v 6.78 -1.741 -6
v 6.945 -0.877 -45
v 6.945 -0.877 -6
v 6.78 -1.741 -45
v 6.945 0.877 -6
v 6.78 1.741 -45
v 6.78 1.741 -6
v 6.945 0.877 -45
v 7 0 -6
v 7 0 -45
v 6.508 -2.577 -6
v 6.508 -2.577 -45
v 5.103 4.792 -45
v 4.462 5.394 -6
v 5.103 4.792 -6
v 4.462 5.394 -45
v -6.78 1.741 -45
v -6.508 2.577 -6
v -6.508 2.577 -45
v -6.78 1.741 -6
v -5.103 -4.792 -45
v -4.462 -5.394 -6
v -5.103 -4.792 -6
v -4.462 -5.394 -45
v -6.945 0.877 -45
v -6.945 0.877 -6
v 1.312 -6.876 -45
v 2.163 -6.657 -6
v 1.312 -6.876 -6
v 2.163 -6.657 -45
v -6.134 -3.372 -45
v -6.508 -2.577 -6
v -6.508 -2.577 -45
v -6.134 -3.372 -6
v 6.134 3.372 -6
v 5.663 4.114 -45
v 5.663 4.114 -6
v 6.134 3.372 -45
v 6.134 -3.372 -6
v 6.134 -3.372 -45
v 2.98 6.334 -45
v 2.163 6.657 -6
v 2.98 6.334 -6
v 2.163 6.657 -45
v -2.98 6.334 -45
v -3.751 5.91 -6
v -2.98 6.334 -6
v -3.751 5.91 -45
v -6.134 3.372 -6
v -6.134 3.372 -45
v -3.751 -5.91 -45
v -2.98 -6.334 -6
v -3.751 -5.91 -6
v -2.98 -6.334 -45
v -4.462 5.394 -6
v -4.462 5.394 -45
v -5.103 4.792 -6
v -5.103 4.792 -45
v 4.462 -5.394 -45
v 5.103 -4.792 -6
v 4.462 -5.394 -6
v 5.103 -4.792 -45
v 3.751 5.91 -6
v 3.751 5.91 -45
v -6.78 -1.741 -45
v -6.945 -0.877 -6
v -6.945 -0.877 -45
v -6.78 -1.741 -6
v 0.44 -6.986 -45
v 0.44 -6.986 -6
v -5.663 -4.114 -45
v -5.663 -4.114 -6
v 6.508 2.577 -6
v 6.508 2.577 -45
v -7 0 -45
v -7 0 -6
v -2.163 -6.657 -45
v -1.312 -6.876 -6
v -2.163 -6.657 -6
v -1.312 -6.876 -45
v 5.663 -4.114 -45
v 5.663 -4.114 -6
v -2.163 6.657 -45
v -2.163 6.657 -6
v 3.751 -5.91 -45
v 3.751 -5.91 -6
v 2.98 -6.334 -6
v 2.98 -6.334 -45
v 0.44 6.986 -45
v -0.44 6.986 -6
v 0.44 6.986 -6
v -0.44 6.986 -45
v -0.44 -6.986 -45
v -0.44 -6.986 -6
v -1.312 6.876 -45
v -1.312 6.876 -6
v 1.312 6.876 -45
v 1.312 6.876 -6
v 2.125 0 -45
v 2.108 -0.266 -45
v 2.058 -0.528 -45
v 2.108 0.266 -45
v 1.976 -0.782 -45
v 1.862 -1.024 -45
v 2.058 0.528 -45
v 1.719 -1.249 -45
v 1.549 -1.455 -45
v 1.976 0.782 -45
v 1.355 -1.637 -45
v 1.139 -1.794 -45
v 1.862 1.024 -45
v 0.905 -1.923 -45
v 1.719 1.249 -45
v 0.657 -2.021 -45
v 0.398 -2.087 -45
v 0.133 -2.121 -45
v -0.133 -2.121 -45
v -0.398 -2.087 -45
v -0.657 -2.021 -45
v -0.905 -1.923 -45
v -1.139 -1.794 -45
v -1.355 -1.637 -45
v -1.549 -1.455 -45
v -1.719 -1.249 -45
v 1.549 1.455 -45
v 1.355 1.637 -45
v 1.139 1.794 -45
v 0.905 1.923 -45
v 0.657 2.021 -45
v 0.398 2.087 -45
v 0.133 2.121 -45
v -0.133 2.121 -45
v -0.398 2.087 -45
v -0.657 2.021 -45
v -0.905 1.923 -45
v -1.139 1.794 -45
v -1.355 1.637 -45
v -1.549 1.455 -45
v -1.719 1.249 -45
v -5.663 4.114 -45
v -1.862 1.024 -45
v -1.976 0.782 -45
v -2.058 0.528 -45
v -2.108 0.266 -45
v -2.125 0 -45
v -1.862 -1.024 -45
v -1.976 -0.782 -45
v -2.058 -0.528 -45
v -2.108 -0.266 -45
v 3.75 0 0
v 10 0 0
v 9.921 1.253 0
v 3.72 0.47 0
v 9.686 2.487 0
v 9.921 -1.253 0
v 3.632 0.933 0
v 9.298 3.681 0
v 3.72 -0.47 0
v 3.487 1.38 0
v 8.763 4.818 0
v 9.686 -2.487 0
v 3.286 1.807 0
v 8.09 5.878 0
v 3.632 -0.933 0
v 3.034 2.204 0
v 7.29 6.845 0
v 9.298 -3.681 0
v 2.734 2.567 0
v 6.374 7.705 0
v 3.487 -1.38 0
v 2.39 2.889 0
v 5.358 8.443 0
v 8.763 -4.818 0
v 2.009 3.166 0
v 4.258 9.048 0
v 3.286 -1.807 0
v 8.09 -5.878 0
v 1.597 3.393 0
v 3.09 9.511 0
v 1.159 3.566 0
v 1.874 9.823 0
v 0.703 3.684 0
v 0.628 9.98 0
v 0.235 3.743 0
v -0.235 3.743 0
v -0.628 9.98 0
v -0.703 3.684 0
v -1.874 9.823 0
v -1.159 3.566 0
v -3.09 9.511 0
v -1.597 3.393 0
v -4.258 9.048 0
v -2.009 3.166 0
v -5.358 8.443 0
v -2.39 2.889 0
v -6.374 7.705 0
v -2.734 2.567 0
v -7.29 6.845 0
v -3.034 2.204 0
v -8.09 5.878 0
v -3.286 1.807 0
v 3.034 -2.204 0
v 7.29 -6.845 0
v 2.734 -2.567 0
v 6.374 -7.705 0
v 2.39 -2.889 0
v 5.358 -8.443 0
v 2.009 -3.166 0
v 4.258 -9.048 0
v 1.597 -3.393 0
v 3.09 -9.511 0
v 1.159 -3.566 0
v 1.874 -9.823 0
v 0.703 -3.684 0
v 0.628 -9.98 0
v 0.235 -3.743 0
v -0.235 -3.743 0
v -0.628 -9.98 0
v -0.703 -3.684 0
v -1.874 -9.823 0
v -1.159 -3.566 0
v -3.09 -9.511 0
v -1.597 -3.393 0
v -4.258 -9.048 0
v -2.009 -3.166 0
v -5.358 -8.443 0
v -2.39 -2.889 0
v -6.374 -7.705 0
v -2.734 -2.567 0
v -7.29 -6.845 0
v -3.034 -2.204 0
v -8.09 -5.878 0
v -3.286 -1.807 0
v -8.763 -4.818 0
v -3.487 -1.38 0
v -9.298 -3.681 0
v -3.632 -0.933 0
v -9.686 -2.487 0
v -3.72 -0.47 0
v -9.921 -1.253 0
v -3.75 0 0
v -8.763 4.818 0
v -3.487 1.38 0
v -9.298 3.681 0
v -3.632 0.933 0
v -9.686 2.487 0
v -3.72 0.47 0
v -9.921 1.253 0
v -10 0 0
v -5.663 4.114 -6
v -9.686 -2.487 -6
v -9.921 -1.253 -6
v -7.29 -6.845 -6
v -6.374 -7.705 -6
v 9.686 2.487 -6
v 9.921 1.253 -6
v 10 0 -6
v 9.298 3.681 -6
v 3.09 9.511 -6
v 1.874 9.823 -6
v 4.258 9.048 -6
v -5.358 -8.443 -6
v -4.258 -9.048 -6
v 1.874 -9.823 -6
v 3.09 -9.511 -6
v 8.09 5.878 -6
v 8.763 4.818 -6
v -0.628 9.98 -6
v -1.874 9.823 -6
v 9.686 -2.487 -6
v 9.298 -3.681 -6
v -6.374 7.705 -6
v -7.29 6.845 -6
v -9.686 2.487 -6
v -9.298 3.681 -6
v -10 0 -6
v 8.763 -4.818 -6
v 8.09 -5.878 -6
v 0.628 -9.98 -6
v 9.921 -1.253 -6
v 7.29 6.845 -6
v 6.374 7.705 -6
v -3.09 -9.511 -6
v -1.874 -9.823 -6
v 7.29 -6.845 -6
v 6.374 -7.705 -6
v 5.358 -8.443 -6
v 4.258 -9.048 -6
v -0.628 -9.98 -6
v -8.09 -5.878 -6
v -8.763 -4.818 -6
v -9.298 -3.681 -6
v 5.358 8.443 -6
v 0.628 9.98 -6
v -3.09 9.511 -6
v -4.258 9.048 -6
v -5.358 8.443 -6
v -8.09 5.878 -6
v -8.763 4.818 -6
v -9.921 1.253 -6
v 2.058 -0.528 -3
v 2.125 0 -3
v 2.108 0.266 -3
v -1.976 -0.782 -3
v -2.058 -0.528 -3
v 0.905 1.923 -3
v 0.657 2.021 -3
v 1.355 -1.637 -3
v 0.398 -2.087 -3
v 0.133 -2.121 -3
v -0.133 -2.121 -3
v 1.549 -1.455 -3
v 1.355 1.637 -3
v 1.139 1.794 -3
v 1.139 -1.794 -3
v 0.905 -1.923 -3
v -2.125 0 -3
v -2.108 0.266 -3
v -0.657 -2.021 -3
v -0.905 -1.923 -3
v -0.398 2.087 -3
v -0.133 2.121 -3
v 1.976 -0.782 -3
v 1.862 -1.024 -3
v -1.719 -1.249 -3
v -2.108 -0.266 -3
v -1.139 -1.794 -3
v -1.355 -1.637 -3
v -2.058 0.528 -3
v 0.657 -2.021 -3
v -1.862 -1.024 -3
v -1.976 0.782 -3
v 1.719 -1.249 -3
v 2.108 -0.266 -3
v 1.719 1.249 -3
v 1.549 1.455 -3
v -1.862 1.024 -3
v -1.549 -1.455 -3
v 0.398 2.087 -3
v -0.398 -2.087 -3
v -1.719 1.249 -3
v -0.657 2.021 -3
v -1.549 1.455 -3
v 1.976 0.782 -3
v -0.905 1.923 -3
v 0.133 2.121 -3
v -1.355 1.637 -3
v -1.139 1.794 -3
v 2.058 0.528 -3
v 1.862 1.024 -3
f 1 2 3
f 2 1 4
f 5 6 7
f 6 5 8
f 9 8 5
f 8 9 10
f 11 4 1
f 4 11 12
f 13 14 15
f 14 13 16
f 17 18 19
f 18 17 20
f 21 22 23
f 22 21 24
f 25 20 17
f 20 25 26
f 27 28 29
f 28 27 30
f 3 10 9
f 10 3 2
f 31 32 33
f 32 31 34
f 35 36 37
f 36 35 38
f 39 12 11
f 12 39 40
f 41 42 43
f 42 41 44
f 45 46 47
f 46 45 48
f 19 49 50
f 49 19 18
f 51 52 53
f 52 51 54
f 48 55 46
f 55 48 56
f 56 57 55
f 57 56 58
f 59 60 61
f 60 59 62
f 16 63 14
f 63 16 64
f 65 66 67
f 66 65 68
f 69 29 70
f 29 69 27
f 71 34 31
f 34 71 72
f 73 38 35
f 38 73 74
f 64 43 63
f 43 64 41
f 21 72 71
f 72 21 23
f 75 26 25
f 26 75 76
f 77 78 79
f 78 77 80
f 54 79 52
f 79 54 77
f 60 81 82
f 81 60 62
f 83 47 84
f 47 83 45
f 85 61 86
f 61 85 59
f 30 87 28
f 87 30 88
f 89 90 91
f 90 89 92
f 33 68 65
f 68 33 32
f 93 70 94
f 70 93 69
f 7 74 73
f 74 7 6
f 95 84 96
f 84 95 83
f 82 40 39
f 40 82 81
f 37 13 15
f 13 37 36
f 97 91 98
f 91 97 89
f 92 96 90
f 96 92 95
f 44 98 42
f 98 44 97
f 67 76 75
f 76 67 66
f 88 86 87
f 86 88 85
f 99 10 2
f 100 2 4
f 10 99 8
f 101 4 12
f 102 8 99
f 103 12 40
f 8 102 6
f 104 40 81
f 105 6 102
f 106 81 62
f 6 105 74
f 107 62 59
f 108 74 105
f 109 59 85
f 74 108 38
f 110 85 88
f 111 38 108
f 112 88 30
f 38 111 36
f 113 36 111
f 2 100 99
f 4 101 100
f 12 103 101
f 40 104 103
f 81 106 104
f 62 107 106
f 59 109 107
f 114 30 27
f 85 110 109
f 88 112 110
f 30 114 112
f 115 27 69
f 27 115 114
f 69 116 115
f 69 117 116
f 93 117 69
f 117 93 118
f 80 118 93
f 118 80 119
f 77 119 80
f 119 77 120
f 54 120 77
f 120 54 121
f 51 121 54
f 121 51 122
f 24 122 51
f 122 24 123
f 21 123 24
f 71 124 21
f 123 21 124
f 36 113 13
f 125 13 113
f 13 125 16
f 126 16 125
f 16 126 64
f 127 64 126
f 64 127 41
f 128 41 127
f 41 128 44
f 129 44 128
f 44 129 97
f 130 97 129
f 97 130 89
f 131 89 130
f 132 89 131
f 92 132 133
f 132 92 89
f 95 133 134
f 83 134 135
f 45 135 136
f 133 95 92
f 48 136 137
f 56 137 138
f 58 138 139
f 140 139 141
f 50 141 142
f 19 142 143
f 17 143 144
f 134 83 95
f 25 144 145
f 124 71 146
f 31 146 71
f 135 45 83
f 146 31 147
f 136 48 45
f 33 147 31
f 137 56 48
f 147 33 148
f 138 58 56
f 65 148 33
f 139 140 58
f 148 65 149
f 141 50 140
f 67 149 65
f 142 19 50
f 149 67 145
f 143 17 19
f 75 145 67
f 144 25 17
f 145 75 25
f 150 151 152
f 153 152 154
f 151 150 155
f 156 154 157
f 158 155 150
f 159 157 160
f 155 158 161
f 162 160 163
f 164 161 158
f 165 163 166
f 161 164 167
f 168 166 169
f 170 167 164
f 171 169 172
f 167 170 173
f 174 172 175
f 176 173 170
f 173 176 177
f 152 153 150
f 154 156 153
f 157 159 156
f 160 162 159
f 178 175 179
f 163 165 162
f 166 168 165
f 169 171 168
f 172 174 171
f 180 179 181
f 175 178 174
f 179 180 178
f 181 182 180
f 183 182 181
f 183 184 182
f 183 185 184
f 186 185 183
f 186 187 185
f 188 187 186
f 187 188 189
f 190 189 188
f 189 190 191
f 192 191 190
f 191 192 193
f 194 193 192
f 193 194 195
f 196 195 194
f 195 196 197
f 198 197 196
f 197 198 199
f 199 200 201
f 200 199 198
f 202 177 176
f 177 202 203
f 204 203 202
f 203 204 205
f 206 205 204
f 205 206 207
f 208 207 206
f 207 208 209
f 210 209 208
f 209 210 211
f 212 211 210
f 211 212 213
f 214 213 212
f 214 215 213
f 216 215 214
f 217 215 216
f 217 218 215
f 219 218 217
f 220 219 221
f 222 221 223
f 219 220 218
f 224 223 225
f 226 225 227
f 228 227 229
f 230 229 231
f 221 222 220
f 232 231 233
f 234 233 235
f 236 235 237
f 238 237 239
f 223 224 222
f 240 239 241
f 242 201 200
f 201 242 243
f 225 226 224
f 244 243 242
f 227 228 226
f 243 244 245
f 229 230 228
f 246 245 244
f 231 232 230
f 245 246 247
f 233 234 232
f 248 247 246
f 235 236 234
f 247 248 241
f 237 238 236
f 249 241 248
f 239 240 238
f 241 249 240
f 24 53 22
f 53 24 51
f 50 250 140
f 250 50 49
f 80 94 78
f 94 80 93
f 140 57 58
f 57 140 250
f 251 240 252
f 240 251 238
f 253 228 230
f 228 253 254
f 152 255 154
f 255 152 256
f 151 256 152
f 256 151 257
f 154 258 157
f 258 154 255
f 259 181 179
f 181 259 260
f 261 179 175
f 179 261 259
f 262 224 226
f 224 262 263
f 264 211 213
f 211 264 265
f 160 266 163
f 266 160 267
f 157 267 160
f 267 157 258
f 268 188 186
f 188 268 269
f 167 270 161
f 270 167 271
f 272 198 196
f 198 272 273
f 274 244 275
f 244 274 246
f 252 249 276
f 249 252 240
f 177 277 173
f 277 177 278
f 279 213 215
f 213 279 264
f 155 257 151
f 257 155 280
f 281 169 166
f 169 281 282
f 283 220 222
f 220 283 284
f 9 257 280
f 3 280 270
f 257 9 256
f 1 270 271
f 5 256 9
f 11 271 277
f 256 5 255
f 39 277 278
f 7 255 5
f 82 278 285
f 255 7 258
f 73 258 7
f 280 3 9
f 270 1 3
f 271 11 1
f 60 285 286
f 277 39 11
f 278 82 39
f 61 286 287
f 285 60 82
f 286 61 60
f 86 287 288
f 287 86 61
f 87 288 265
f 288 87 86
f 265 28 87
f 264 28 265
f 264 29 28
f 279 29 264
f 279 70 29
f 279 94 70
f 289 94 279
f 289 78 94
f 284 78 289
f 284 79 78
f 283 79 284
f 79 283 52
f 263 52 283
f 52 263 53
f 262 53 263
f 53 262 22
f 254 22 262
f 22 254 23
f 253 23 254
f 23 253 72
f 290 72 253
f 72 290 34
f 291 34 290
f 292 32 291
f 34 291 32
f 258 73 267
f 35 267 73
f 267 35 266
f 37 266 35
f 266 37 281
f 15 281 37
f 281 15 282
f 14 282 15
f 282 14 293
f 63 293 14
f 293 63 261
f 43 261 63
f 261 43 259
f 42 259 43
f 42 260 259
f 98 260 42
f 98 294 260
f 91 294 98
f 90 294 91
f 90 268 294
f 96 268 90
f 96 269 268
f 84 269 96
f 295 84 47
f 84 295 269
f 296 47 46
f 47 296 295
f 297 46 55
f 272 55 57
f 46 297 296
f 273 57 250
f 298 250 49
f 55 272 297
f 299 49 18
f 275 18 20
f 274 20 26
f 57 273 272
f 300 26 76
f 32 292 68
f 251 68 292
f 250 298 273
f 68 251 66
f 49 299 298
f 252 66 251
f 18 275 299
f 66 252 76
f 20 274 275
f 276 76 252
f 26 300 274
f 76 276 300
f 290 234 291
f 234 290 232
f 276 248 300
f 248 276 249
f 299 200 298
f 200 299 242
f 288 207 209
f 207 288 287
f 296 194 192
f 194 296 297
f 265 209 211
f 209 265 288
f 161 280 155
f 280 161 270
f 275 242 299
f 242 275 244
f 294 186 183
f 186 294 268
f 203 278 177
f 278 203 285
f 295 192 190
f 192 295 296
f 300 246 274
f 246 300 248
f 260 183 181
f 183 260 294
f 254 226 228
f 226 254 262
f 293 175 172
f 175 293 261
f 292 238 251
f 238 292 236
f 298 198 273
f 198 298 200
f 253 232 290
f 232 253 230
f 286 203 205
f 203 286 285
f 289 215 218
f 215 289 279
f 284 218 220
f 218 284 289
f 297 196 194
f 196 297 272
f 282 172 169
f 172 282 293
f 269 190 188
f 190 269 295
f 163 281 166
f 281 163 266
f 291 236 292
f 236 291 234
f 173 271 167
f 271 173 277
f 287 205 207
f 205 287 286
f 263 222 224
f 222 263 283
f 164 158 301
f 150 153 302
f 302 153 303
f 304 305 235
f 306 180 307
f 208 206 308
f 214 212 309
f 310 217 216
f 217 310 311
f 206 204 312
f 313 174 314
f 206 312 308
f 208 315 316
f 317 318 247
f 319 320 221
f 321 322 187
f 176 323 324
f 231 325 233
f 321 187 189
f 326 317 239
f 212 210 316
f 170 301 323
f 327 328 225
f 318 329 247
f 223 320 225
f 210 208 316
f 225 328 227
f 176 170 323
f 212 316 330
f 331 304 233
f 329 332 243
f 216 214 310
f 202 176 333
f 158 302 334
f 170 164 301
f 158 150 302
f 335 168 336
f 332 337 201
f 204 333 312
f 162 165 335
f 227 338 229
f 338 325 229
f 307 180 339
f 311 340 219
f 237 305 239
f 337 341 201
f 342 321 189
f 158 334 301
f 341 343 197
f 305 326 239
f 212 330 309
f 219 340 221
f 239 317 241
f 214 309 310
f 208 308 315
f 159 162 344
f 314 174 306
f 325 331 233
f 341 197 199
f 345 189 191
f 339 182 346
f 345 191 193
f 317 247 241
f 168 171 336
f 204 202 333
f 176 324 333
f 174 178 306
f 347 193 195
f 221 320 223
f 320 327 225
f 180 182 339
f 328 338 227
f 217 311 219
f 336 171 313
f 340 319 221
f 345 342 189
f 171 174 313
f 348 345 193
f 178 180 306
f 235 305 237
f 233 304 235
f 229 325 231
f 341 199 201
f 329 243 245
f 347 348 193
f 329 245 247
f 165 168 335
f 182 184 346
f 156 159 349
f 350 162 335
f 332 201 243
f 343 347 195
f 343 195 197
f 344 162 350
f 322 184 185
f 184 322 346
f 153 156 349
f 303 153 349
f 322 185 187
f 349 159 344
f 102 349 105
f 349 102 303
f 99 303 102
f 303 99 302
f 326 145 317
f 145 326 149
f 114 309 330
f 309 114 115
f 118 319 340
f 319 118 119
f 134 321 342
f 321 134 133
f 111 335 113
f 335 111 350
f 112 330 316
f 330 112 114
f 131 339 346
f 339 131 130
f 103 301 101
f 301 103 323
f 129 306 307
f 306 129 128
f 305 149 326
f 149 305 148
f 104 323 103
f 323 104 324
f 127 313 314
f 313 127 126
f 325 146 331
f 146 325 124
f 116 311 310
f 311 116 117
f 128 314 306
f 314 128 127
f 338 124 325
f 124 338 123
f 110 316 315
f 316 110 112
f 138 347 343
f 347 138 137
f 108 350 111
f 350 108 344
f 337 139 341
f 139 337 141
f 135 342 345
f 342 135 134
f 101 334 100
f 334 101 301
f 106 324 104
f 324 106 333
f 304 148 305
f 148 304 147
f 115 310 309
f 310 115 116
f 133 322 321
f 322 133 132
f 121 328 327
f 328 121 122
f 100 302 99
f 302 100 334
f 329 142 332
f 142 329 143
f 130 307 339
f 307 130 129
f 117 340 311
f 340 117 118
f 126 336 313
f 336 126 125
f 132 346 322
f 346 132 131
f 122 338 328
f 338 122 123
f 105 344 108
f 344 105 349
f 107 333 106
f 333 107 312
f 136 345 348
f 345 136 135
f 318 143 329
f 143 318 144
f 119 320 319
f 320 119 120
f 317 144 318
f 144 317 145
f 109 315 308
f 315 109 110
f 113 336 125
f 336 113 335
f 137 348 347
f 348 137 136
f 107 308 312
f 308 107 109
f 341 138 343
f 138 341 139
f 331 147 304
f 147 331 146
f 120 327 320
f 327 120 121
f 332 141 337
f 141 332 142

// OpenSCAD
$fn = 50;


difference() {
	union() {
		translate(v = [0, 0, -45.0000000000]) {
			cylinder(h = 45, r = 7.0000000000);
		}
		translate(v = [0, 0, -6.0000000000]) {
			cylinder(h = 6, r = 10.0000000000);
		}
	}
	union() {
		translate(v = [0, 0, 0]) {
			rotate(a = [0, 0, 0]) {
				difference() {
					union() {
						#translate(v = [0, 0, -45.0000000000]) {
							cylinder(h = 45, r = 2.0000000000);
						}
						#translate(v = [0, 0, -3]) {
							cylinder(h = 3, r = 7.0000000000, r1 = 2.1250000000, r2 = 3.7500000000);
						}
						#translate(v = [0, 0, -45.0000000000]) {
							cylinder(h = 45, r = 2.1250000000);
						}
						#translate(v = [0, 0, -45.0000000000]) {
							cylinder(h = 45, r = 2.0000000000);
						}
					}
					union();
				}
			}
		}
	}
}
